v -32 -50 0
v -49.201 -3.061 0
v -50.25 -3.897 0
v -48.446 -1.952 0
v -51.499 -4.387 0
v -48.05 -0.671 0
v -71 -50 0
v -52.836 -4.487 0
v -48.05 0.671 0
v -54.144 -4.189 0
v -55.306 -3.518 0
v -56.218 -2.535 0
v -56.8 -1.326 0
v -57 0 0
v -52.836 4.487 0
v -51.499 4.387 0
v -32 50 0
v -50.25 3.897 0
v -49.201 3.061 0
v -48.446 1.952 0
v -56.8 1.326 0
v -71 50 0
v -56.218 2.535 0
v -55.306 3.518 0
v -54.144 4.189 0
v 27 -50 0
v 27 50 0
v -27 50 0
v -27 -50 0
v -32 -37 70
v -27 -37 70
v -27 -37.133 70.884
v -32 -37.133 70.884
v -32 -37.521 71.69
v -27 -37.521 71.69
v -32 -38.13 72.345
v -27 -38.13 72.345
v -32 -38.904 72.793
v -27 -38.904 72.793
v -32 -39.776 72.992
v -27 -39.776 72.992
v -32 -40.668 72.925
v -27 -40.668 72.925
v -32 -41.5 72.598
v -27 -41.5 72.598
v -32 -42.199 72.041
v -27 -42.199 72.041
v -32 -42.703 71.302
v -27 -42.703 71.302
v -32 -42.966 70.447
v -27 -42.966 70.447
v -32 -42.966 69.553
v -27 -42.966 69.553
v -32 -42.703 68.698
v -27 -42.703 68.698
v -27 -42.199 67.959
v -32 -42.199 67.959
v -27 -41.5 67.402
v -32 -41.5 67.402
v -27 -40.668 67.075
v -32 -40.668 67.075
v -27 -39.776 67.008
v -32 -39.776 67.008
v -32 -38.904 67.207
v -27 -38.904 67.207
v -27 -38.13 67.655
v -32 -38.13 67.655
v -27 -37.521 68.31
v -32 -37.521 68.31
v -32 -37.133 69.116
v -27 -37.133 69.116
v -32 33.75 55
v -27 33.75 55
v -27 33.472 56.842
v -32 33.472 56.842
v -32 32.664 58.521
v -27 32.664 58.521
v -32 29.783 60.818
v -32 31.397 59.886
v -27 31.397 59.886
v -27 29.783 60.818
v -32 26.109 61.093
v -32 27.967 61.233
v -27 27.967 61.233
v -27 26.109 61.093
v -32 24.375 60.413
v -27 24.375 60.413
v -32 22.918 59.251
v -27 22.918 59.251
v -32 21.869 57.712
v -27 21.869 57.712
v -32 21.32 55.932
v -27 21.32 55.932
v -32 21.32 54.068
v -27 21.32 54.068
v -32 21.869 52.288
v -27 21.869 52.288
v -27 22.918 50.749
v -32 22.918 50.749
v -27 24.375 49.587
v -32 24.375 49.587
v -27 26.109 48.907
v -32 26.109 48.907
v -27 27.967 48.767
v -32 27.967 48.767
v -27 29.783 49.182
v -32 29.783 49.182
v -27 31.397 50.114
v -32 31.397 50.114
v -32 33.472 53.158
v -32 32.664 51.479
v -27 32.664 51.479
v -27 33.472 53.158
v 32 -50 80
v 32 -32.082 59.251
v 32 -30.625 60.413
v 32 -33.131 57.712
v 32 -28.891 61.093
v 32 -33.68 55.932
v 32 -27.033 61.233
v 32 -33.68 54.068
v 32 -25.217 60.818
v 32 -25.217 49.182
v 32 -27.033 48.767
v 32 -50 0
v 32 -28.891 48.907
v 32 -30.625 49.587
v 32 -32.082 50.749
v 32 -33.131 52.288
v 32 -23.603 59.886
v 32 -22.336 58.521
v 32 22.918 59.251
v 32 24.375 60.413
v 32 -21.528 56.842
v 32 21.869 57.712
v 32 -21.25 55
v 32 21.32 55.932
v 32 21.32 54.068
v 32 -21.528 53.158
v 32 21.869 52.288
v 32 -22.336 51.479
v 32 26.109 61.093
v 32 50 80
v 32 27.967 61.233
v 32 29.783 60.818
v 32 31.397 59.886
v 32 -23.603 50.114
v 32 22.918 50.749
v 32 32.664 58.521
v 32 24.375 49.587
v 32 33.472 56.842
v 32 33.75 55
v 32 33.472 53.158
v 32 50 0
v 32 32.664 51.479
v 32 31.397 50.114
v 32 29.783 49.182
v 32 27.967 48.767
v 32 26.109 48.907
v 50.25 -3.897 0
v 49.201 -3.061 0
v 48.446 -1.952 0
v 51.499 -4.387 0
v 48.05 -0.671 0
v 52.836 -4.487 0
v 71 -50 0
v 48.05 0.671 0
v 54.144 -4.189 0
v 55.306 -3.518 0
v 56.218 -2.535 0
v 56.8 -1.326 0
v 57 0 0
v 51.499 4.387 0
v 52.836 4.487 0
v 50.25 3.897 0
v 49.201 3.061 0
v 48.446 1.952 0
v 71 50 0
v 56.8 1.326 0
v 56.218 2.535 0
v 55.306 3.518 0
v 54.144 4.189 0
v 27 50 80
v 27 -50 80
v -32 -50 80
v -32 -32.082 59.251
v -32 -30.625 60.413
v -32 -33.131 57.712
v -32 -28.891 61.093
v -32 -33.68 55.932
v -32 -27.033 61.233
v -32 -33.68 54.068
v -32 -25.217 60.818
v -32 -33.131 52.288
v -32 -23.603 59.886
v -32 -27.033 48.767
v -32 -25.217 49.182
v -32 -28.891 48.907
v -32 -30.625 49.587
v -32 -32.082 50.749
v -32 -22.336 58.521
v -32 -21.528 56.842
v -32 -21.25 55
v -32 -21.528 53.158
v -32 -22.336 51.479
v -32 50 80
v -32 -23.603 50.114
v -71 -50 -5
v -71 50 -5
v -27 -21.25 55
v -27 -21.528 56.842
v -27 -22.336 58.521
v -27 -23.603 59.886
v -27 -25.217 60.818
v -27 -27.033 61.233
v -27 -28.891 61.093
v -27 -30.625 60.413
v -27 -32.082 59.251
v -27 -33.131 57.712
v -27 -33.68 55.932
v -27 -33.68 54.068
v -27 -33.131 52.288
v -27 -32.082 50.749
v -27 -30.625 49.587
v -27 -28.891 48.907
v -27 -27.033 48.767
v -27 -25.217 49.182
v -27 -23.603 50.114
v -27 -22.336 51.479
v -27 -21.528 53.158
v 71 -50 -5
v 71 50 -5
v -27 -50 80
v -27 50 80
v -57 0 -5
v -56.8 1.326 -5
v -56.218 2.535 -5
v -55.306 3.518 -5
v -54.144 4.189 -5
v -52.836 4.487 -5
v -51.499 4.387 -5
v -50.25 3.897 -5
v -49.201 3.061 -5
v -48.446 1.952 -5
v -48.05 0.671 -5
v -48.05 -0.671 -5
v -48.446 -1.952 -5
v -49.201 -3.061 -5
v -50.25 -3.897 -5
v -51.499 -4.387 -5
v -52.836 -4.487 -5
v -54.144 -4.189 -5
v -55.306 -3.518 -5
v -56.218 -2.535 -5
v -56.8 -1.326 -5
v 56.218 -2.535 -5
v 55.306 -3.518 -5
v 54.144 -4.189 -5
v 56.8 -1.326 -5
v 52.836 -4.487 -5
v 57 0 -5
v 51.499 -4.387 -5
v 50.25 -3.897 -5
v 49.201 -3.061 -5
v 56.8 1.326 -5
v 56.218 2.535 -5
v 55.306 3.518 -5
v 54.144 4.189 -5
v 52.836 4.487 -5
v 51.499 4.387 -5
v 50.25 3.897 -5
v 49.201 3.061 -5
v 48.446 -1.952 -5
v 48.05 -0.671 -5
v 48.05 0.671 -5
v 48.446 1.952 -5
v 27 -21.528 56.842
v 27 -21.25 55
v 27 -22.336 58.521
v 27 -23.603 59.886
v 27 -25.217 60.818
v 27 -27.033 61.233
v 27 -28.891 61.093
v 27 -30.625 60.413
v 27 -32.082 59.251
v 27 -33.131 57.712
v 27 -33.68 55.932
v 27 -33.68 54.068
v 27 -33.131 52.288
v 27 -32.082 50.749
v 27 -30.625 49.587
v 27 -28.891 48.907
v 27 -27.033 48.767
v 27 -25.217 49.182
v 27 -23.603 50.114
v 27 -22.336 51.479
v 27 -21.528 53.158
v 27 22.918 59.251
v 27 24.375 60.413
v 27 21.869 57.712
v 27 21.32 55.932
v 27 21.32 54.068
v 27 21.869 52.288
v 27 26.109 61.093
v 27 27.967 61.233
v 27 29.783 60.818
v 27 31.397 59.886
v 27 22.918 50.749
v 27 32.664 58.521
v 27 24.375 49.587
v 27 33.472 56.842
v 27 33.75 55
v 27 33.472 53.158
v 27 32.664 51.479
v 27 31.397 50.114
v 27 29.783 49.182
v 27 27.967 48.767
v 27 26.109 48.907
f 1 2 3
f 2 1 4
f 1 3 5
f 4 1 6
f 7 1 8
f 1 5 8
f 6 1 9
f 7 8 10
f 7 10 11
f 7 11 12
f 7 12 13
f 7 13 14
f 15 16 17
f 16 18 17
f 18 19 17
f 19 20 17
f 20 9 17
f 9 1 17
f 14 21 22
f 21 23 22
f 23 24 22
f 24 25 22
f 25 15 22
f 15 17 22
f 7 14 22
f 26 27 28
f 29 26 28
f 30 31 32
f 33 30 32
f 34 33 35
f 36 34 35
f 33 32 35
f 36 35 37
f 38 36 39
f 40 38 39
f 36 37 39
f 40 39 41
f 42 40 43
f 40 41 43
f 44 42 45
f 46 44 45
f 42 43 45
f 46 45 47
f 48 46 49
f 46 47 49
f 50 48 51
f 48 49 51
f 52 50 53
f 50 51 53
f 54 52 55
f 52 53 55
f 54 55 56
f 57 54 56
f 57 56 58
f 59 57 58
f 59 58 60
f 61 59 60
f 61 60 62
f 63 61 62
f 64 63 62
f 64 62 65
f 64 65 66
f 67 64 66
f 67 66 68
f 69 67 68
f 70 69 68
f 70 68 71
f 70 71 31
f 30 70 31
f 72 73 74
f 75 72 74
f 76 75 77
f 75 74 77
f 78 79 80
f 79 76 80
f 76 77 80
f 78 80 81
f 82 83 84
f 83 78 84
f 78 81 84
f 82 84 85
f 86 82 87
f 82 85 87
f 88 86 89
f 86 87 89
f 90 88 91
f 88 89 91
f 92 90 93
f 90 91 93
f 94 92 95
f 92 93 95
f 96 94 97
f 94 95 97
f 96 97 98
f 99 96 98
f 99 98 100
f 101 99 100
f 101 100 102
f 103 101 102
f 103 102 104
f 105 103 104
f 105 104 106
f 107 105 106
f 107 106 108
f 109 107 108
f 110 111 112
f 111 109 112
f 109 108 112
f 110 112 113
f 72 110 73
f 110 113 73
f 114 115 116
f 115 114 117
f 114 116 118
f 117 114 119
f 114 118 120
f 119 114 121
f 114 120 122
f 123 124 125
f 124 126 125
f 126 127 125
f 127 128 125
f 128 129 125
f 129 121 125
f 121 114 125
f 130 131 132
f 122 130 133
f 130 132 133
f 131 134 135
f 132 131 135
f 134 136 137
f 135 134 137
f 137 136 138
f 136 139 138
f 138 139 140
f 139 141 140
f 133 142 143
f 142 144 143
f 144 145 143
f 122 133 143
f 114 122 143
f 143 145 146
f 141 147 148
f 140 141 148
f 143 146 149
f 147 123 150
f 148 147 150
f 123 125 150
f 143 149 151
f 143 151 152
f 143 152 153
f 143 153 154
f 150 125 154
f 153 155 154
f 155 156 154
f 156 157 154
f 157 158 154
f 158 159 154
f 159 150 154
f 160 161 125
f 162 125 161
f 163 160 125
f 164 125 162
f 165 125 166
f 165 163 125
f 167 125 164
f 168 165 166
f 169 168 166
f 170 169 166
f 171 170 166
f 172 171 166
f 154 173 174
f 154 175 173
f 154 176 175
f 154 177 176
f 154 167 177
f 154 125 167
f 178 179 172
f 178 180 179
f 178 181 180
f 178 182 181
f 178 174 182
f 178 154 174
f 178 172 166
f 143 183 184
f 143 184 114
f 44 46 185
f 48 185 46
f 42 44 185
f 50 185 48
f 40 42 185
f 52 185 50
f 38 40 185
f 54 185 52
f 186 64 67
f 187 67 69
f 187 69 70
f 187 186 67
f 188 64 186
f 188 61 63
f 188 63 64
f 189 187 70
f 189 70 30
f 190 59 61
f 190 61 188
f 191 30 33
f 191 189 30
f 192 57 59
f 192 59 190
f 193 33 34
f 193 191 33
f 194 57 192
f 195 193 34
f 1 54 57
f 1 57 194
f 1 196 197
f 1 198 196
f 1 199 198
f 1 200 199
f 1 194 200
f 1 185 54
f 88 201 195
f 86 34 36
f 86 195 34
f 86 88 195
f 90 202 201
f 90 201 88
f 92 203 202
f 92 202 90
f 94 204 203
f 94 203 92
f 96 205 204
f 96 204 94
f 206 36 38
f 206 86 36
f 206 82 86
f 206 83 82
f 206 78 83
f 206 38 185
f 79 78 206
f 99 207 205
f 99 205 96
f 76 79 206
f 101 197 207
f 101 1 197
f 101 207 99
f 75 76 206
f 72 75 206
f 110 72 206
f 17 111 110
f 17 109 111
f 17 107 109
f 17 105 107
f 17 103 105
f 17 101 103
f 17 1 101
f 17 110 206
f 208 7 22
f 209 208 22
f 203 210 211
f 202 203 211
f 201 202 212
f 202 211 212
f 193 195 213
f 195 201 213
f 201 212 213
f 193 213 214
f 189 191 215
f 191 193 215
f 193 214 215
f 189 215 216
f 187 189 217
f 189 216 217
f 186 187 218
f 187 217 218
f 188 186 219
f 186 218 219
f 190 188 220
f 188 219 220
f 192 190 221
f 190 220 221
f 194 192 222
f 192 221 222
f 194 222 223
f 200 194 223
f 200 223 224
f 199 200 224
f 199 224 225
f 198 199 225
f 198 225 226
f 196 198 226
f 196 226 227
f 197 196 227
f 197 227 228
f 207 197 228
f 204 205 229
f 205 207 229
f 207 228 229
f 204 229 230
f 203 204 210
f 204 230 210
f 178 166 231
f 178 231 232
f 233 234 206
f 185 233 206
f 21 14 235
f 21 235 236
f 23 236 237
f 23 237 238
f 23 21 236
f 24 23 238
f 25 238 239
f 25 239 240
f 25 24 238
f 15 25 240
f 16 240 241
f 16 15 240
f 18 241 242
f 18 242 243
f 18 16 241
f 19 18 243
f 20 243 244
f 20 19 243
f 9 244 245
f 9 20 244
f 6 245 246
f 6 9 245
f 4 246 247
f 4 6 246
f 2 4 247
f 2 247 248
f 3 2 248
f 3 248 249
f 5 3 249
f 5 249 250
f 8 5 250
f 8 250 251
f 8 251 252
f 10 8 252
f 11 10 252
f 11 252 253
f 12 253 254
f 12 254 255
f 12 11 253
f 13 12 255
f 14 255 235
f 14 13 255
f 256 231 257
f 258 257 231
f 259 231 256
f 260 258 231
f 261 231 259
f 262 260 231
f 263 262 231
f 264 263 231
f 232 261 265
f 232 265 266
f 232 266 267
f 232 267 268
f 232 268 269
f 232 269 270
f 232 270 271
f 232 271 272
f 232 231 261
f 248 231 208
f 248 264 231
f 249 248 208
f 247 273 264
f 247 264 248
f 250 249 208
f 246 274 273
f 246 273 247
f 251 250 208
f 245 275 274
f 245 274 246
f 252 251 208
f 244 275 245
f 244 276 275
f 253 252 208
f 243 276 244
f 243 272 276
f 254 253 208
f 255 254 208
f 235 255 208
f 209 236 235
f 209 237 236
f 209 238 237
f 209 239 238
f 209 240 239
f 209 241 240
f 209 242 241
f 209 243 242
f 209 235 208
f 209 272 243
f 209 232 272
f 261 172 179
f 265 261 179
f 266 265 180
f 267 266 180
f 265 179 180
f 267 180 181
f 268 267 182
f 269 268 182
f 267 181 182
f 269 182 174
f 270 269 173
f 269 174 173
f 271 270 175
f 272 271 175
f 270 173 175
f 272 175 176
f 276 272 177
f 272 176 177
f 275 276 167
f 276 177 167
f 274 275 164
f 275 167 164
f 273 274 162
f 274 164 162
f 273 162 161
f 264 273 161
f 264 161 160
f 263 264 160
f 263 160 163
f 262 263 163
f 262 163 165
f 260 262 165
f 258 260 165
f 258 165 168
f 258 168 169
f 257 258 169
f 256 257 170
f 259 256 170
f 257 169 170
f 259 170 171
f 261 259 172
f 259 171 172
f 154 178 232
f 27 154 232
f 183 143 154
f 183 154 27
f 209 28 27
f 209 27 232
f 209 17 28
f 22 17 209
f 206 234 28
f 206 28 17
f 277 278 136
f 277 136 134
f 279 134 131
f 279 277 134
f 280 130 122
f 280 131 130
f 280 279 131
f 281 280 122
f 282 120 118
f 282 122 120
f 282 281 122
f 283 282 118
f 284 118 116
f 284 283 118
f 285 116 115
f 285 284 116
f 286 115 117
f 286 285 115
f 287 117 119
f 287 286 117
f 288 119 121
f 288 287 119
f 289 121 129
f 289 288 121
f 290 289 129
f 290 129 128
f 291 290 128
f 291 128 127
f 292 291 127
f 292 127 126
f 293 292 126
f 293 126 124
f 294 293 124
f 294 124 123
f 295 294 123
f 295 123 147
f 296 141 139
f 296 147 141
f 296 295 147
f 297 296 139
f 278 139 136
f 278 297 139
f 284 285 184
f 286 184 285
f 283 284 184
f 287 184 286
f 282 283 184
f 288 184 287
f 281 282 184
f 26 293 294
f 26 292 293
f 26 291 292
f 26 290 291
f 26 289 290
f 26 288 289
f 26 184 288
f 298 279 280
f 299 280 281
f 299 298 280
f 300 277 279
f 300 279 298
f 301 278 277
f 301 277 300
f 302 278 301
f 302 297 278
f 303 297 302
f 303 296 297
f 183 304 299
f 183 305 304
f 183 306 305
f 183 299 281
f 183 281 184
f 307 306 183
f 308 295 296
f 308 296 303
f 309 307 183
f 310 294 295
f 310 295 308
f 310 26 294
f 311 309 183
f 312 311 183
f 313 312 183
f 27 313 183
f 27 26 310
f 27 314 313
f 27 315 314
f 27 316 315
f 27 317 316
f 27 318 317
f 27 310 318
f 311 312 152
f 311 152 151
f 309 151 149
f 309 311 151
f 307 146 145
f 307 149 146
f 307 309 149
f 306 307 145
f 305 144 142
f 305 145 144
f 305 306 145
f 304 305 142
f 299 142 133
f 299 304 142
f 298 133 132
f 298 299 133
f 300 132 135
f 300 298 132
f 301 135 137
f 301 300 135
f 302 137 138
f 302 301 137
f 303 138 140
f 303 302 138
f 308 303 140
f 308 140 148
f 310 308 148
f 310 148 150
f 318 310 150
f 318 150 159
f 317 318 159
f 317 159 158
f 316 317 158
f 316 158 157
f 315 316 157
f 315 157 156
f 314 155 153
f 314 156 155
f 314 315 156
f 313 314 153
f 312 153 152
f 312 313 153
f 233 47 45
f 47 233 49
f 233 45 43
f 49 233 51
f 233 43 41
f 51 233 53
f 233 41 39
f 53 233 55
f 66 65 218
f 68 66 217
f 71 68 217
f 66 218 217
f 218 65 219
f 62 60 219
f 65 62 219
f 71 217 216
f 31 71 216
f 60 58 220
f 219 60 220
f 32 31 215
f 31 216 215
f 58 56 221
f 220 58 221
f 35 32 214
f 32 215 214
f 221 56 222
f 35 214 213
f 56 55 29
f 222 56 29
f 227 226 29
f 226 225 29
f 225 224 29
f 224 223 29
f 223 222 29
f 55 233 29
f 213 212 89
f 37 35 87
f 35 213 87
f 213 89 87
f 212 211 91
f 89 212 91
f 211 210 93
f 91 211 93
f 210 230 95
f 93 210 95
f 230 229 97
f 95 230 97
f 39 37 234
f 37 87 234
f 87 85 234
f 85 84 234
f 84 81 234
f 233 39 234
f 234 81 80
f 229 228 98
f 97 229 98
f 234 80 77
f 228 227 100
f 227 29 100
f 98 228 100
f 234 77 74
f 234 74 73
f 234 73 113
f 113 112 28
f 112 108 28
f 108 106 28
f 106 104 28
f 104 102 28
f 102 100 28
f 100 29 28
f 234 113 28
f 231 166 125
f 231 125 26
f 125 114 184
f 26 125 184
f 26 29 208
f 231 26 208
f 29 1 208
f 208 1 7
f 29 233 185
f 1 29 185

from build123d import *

# Parameters (mm, degrees)
F0_W     = 71
F0_H     = 100
F0_R     = 4.5
F1_DEPTH = 5
F2_W     = 5
F2_H     = 100
F3_DEPTH = 80
F4_R     = 6.25
F5_DEPTH = 71.001
F7_R     = 3
F8_DEPTH = 71.001


with BuildPart() as f1:
    # F0 (on Top) → F1 (new body)
    with BuildSketch(Plane.XY):
        with Locations((35.5, 0)):
            Rectangle(F0_W, F0_H)
        with Locations((52.5, 0)):
            Circle(F0_R, mode=Mode.SUBTRACT)
    extrude(amount=-F1_DEPTH)

    # F2 (on face) → F3 (join)
    with BuildSketch(Plane.XY):
        with Locations((29.5, 0)):
            Rectangle(F2_W, F2_H)
    extrude(amount=F3_DEPTH)

    # F4 (on Right) → F5 (cut, through all)
    with BuildSketch(Plane.YZ):
        with Locations((-27.5, 55)):
            Circle(F4_R)
        with Locations((27.5, 55)):
            Circle(F4_R)
    extrude(amount=F5_DEPTH, mode=Mode.SUBTRACT)

    # F6: F1 across face


with BuildPart() as f1_1:
    add(f1.part)
    add(f1.part.mirror(Plane(origin=(0, 0, -2.5), x_dir=(0, -1, 0), z_dir=(-1, 0, 0))))

    # F7 (on Right) → F8 (cut, through all)
    with BuildSketch(Plane.YZ):
        with Locations((-40, 70)):
            Circle(F7_R)
    extrude(amount=-F8_DEPTH, mode=Mode.SUBTRACT)


solid = f1_1.part
